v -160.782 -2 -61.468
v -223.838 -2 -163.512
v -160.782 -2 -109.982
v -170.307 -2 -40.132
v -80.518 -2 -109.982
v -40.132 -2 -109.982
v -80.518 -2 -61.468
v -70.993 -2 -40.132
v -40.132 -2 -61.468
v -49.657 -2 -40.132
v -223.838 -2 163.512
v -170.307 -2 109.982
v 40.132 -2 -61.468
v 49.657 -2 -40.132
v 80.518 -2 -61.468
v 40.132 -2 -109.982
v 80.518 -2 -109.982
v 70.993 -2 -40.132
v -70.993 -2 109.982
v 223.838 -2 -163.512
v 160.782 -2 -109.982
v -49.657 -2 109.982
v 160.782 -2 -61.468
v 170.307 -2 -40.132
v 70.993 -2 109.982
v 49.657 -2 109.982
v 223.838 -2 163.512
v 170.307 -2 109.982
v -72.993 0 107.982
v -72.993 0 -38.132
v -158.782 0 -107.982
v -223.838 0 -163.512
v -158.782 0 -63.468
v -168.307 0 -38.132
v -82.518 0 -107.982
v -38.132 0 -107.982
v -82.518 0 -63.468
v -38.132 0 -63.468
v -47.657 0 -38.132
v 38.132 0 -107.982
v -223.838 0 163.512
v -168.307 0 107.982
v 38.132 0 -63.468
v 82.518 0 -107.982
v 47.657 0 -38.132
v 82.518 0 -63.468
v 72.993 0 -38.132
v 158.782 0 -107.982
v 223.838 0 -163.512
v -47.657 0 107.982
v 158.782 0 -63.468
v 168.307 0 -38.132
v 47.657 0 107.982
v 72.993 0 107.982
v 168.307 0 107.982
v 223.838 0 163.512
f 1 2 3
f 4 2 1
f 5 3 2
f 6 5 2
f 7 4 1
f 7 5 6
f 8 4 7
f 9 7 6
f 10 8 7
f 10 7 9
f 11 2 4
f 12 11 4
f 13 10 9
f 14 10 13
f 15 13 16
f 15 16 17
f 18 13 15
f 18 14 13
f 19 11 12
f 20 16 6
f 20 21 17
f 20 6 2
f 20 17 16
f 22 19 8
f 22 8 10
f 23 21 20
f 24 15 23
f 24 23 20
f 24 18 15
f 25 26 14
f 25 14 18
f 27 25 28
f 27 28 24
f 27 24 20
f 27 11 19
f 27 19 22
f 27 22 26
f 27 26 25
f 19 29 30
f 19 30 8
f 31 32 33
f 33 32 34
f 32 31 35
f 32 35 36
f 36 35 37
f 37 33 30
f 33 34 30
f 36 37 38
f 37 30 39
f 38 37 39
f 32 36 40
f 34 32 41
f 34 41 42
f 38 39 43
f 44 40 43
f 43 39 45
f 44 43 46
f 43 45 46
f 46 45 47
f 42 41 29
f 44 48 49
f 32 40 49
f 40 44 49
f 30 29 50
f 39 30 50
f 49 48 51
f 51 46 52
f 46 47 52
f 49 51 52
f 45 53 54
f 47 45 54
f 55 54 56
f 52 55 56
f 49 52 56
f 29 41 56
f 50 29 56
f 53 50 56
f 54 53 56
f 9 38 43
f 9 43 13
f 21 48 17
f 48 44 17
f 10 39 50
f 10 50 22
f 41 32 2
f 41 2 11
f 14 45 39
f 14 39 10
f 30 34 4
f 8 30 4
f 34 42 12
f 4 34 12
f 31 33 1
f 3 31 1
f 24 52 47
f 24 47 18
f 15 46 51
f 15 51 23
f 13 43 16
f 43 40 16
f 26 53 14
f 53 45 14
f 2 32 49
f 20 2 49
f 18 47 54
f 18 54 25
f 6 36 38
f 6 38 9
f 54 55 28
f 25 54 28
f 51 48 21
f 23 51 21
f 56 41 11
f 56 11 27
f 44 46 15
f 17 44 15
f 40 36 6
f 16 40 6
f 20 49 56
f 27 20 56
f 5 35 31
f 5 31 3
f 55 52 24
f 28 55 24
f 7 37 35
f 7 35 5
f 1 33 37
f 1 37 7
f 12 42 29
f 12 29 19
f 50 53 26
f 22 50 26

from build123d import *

# Parameters (mm, degrees)
F0_W          = 447.675
F0_H          = 327.025
F0_W_2        = 76.2
F0_H_2        = 44.45
F0_W_3        = 95.25
F0_H_3        = 146.05
F1_DEPTH      = 2
F2_T1_DEPTH   = 95.25
F2_T3_DEPTH   = 146.05
F2_T5_DEPTH   = 95.25
F2_T7_DEPTH   = 95.25
F2_T9_DEPTH   = 76.2
F2_T11_DEPTH  = 44.45
F2_T13_DEPTH  = 76.2
F2_T15_DEPTH  = 76.2
F2_T21_DEPTH  = 151.2756598315
F2_T25_DEPTH  = 100.4756598315
F2_T32_DEPTH  = 100.4756598315
F2_T36_DEPTH  = 151.2756598315
F2_T43_DEPTH  = 151.2756598315
F2_T47_DEPTH  = 100.4756598315
F2_T54_DEPTH  = 151.2756598315
F2_T58_DEPTH  = 100.4756598315
F2_T65_DEPTH  = 151.2756598315
F2_T69_DEPTH  = 100.4756598315
F2_T76_DEPTH  = 151.2756598315
F2_T80_DEPTH  = 100.4756598315
F2_T87_DEPTH  = 100.4756598315
F2_T91_DEPTH  = 151.2756598315
F2_T98_DEPTH  = 151.2756598315
F2_T102_DEPTH = 100.4756598315
F2_T109_DEPTH = 151.2756598315
F2_T113_DEPTH = 100.4756598315
F2_T120_DEPTH = 100.4756598315
F2_T124_DEPTH = 151.2756598315
F2_T131_DEPTH = 151.2756598315
F2_T135_DEPTH = 100.4756598315
F2_T142_DEPTH = 151.2756598315
F2_T146_DEPTH = 100.4756598315
F2_T153_DEPTH = 49.6756598315
F2_T157_DEPTH = 81.4256598315
F2_T164_DEPTH = 81.4256598315
F2_T168_DEPTH = 49.6756598315
F2_T175_DEPTH = 49.6756598315
F2_T179_DEPTH = 81.4256598315
F2_T186_DEPTH = 49.6756598315
F2_T190_DEPTH = 81.4256598315
F2_T197_DEPTH = 81.4256598315
F2_T201_DEPTH = 49.6756598315
F2_T208_DEPTH = 81.4256598315
F2_T212_DEPTH = 49.6756598315
F2_T219_DEPTH = 49.6756598315
F2_T223_DEPTH = 81.4256598315
F2_T230_DEPTH = 81.4256598315
F2_T234_DEPTH = 49.6756598315
F2_T241_DEPTH = 49.6756598315
F2_T245_DEPTH = 81.4256598315
F2_T252_DEPTH = 81.4256598315
F2_T256_DEPTH = 49.6756598315
F2_T263_DEPTH = 81.4256598315
F2_T267_DEPTH = 49.6756598315
F2_T274_DEPTH = 81.4256598315
F2_T278_DEPTH = 49.6756598315


# Not quite as in the source:
# - a fillet or chamfer that OpenCascade refuses, or shapes differently, is made with other operations: its cross-section is extruded or revolved along the edge and cut away or added


with BuildPart() as f1:
    # F0 (on Front) → F1 (new body)
    with BuildSketch(Plane.XZ):
        Rectangle(F0_W, F0_H)
        with Locations((-120.65, -85.725)):
            Rectangle(F0_W_2, F0_H_2, mode=Mode.SUBTRACT)
        with Locations((0, -85.725)):
            Rectangle(F0_W_2, F0_H_2, mode=Mode.SUBTRACT)
        with Locations((120.65, -85.725)):
            Rectangle(F0_W_2, F0_H_2, mode=Mode.SUBTRACT)
        with Locations((-120.65, 34.925)):
            Rectangle(F0_W_3, F0_H_3, mode=Mode.SUBTRACT)
        with Locations((0, 34.925)):
            Rectangle(F0_W_3, F0_H_3, mode=Mode.SUBTRACT)
        with Locations((120.65, 34.925)):
            Rectangle(F0_W_3, F0_H_3, mode=Mode.SUBTRACT)
    extrude(amount=F1_DEPTH)

    # F2: chamfer of 2.032 on 24 edges, made by hand

    # F2_s2 → F2_t1 (cut)
    with BuildSketch(Plane.YZ.offset(-168.275)):
        Polygon((0.032, 107.95), (-2, 109.982), (-2, 107.95), align=None)
        Polygon((0.032, -38.1), (-2, -40.132), (-2, -38.1), align=None)
    extrude(amount=F2_T1_DEPTH, mode=Mode.SUBTRACT)

    # F2_s4 → F2_t3 (cut)
    with BuildSketch(Plane.XY.offset(-38.1)):
        Polygon((-168.275, 0.032), (-170.307, -2), (-168.275, -2), align=None)
        Polygon((-73.025, 0.032), (-70.993, -2), (-73.025, -2), align=None)
        Polygon((-47.625, 0.032), (-49.657, -2), (-47.625, -2), align=None)
        Polygon((47.625, 0.032), (49.657, -2), (47.625, -2), align=None)
        Polygon((73.025, 0.032), (70.993, -2), (73.025, -2), align=None)
        Polygon((168.275, 0.032), (170.307, -2), (168.275, -2), align=None)
    extrude(amount=F2_T3_DEPTH, mode=Mode.SUBTRACT)

    # F2_s6 → F2_t5 (cut)
    with BuildSketch(Plane.YZ.offset(-47.625)):
        Polygon((0.032, 107.95), (-2, 109.982), (-2, 107.95), align=None)
        Polygon((0.032, -38.1), (-2, -40.132), (-2, -38.1), align=None)
    extrude(amount=F2_T5_DEPTH, mode=Mode.SUBTRACT)

    # F2_s8 → F2_t7 (cut)
    with BuildSketch(Plane.YZ.offset(73.025)):
        Polygon((0.032, -38.1), (-2, -40.132), (-2, -38.1), align=None)
        Polygon((0.032, 107.95), (-2, 109.982), (-2, 107.95), align=None)
    extrude(amount=F2_T7_DEPTH, mode=Mode.SUBTRACT)

    # F2_s10 → F2_t9 (cut)
    with BuildSketch(Plane.YZ.offset(82.55)):
        Polygon((0.032, -63.5), (-2, -61.468), (-2, -63.5), align=None)
        Polygon((0.032, -107.95), (-2, -109.982), (-2, -107.95), align=None)
    extrude(amount=F2_T9_DEPTH, mode=Mode.SUBTRACT)

    # F2_s12 → F2_t11 (cut)
    with BuildSketch(Plane.XY.offset(-107.95)):
        Polygon((158.75, 0.032), (160.782, -2), (158.75, -2), align=None)
        Polygon((82.55, 0.032), (80.518, -2), (82.55, -2), align=None)
        Polygon((38.1, 0.032), (40.132, -2), (38.1, -2), align=None)
        Polygon((-38.1, 0.032), (-40.132, -2), (-38.1, -2), align=None)
        Polygon((-82.55, 0.032), (-80.518, -2), (-82.55, -2), align=None)
        Polygon((-158.75, 0.032), (-160.782, -2), (-158.75, -2), align=None)
    extrude(amount=F2_T11_DEPTH, mode=Mode.SUBTRACT)

    # F2_s14 → F2_t13 (cut)
    with BuildSketch(Plane.YZ.offset(-38.1)):
        Polygon((0.032, -63.5), (-2, -61.468), (-2, -63.5), align=None)
        Polygon((0.032, -107.95), (-2, -109.982), (-2, -107.95), align=None)
    extrude(amount=F2_T13_DEPTH, mode=Mode.SUBTRACT)

    # F2_s16 → F2_t15 (cut)
    with BuildSketch(Plane.YZ.offset(-158.75)):
        Polygon((0.032, -107.95), (-2, -109.982), (-2, -107.95), align=None)
        Polygon((0.032, -63.5), (-2, -61.468), (-2, -63.5), align=None)
    extrude(amount=F2_T15_DEPTH, mode=Mode.SUBTRACT)


with BuildPart() as f2_tool19:
    # F2_s20 → F2_t21 (new body)
    with BuildSketch(Plane.XY.offset(-38.1)):
        Polygon((-168.275, 0.032), (-170.307, -2), (-168.275, -2), align=None)
    extrude(amount=F2_T21_DEPTH)

    split(bisect_by=Plane.XY.offset(107.95), keep=Keep.TOP)


with BuildPart() as f2_tool23:
    # F2_s24 → F2_t25 (new body)
    with BuildSketch(Plane.YZ.offset(-173.5006598315)):
        Polygon((0.032, 107.95), (-2, 109.982), (-2, 107.95), align=None)
    extrude(amount=F2_T25_DEPTH)

    split(bisect_by=Plane.YZ.offset(-168.275), keep=Keep.BOTTOM)


with BuildPart() as f2_tool19_1:
    add(f2_tool19.part)

    # F2_t27: intersect F2_tool23
    add(f2_tool23.part, mode=Mode.INTERSECT)


with BuildPart() as f1_1:
    add(f1.part)

    # F2_t17: cut F2_tool19
    add(f2_tool19_1.part, mode=Mode.SUBTRACT)


with BuildPart() as f2_tool30:
    # F2_s31 → F2_t32 (new body)
    with BuildSketch(Plane.YZ.offset(-168.275)):
        Polygon((0.032, 107.95), (-2, 109.982), (-2, 107.95), align=None)
    extrude(amount=F2_T32_DEPTH)

    split(bisect_by=Plane.YZ.offset(-73.025), keep=Keep.TOP)


with BuildPart() as f2_tool34:
    # F2_s35 → F2_t36 (new body)
    with BuildSketch(Plane.XY.offset(113.1756598315)):
        Polygon((-73.025, 0.032), (-70.993, -2), (-73.025, -2), align=None)
    extrude(amount=-F2_T36_DEPTH)

    split(bisect_by=Plane.XY.offset(107.95), keep=Keep.TOP)


with BuildPart() as f2_tool30_1:
    add(f2_tool30.part)

    # F2_t38: intersect F2_tool34
    add(f2_tool34.part, mode=Mode.INTERSECT)


with BuildPart() as f1_2:
    add(f1_1.part)

    # F2_t28: cut F2_tool30
    add(f2_tool30_1.part, mode=Mode.SUBTRACT)


with BuildPart() as f2_tool41:
    # F2_s42 → F2_t43 (new body)
    with BuildSketch(Plane.XY.offset(-43.3256598315)):
        Polygon((-168.275, 0.032), (-170.307, -2), (-168.275, -2), align=None)
    extrude(amount=F2_T43_DEPTH)

    split(bisect_by=Plane.XY.offset(-38.1), keep=Keep.BOTTOM)


with BuildPart() as f2_tool45:
    # F2_s46 → F2_t47 (new body)
    with BuildSketch(Plane.YZ.offset(-73.025)):
        Polygon((0.032, -38.1), (-2, -40.132), (-2, -38.1), align=None)
    extrude(amount=-F2_T47_DEPTH)

    split(bisect_by=Plane.YZ.offset(-168.275), keep=Keep.BOTTOM)


with BuildPart() as f2_tool41_1:
    add(f2_tool41.part)

    # F2_t49: intersect F2_tool45
    add(f2_tool45.part, mode=Mode.INTERSECT)


with BuildPart() as f1_3:
    add(f1_2.part)

    # F2_t39: cut F2_tool41
    add(f2_tool41_1.part, mode=Mode.SUBTRACT)


with BuildPart() as f2_tool52:
    # F2_s53 → F2_t54 (new body)
    with BuildSketch(Plane.XY.offset(107.95)):
        Polygon((-73.025, 0.032), (-70.993, -2), (-73.025, -2), align=None)
    extrude(amount=-F2_T54_DEPTH)

    split(bisect_by=Plane.XY.offset(-38.1), keep=Keep.BOTTOM)


with BuildPart() as f2_tool56:
    # F2_s57 → F2_t58 (new body)
    with BuildSketch(Plane.YZ.offset(-67.7993401685)):
        Polygon((0.032, -38.1), (-2, -40.132), (-2, -38.1), align=None)
    extrude(amount=-F2_T58_DEPTH)

    split(bisect_by=Plane.YZ.offset(-73.025), keep=Keep.TOP)


with BuildPart() as f2_tool52_1:
    add(f2_tool52.part)

    # F2_t60: intersect F2_tool56
    add(f2_tool56.part, mode=Mode.INTERSECT)


with BuildPart() as f1_4:
    add(f1_3.part)

    # F2_t50: cut F2_tool52
    add(f2_tool52_1.part, mode=Mode.SUBTRACT)


with BuildPart() as f2_tool63:
    # F2_s64 → F2_t65 (new body)
    with BuildSketch(Plane.XY.offset(-38.1)):
        Polygon((-47.625, 0.032), (-49.657, -2), (-47.625, -2), align=None)
    extrude(amount=F2_T65_DEPTH)

    split(bisect_by=Plane.XY.offset(107.95), keep=Keep.TOP)


with BuildPart() as f2_tool67:
    # F2_s68 → F2_t69 (new body)
    with BuildSketch(Plane.YZ.offset(-52.8506598315)):
        Polygon((0.032, 107.95), (-2, 109.982), (-2, 107.95), align=None)
    extrude(amount=F2_T69_DEPTH)

    split(bisect_by=Plane.YZ.offset(-47.625), keep=Keep.BOTTOM)


with BuildPart() as f2_tool63_1:
    add(f2_tool63.part)

    # F2_t71: intersect F2_tool67
    add(f2_tool67.part, mode=Mode.INTERSECT)


with BuildPart() as f1_5:
    add(f1_4.part)

    # F2_t61: cut F2_tool63
    add(f2_tool63_1.part, mode=Mode.SUBTRACT)


with BuildPart() as f2_tool74:
    # F2_s75 → F2_t76 (new body)
    with BuildSketch(Plane.XY.offset(113.1756598315)):
        Polygon((47.625, 0.032), (49.657, -2), (47.625, -2), align=None)
    extrude(amount=-F2_T76_DEPTH)

    split(bisect_by=Plane.XY.offset(107.95), keep=Keep.TOP)


with BuildPart() as f2_tool78:
    # F2_s79 → F2_t80 (new body)
    with BuildSketch(Plane.YZ.offset(-47.625)):
        Polygon((0.032, 107.95), (-2, 109.982), (-2, 107.95), align=None)
    extrude(amount=F2_T80_DEPTH)

    split(bisect_by=Plane.YZ.offset(47.625), keep=Keep.TOP)


with BuildPart() as f2_tool74_1:
    add(f2_tool74.part)

    # F2_t82: intersect F2_tool78
    add(f2_tool78.part, mode=Mode.INTERSECT)


with BuildPart() as f1_6:
    add(f1_5.part)

    # F2_t72: cut F2_tool74
    add(f2_tool74_1.part, mode=Mode.SUBTRACT)


with BuildPart() as f2_tool85:
    # F2_s86 → F2_t87 (new body)
    with BuildSketch(Plane.YZ.offset(47.625)):
        Polygon((0.032, -38.1), (-2, -40.132), (-2, -38.1), align=None)
    extrude(amount=-F2_T87_DEPTH)

    split(bisect_by=Plane.YZ.offset(-47.625), keep=Keep.BOTTOM)


with BuildPart() as f2_tool89:
    # F2_s90 → F2_t91 (new body)
    with BuildSketch(Plane.XY.offset(-43.3256598315)):
        Polygon((-47.625, 0.032), (-49.657, -2), (-47.625, -2), align=None)
    extrude(amount=F2_T91_DEPTH)

    split(bisect_by=Plane.XY.offset(-38.1), keep=Keep.BOTTOM)


with BuildPart() as f2_tool85_1:
    add(f2_tool85.part)

    # F2_t93: intersect F2_tool89
    add(f2_tool89.part, mode=Mode.INTERSECT)


with BuildPart() as f1_7:
    add(f1_6.part)

    # F2_t83: cut F2_tool85
    add(f2_tool85_1.part, mode=Mode.SUBTRACT)


with BuildPart() as f2_tool96:
    # F2_s97 → F2_t98 (new body)
    with BuildSketch(Plane.XY.offset(107.95)):
        Polygon((47.625, 0.032), (49.657, -2), (47.625, -2), align=None)
    extrude(amount=-F2_T98_DEPTH)

    split(bisect_by=Plane.XY.offset(-38.1), keep=Keep.BOTTOM)


with BuildPart() as f2_tool100:
    # F2_s101 → F2_t102 (new body)
    with BuildSketch(Plane.YZ.offset(52.8506598315)):
        Polygon((0.032, -38.1), (-2, -40.132), (-2, -38.1), align=None)
    extrude(amount=-F2_T102_DEPTH)

    split(bisect_by=Plane.YZ.offset(47.625), keep=Keep.TOP)


with BuildPart() as f2_tool96_1:
    add(f2_tool96.part)

    # F2_t104: intersect F2_tool100
    add(f2_tool100.part, mode=Mode.INTERSECT)


with BuildPart() as f1_8:
    add(f1_7.part)

    # F2_t94: cut F2_tool96
    add(f2_tool96_1.part, mode=Mode.SUBTRACT)


with BuildPart() as f2_tool107:
    # F2_s108 → F2_t109 (new body)
    with BuildSketch(Plane.XY.offset(107.95)):
        Polygon((168.275, 0.032), (170.307, -2), (168.275, -2), align=None)
    extrude(amount=-F2_T109_DEPTH)

    split(bisect_by=Plane.XY.offset(-38.1), keep=Keep.BOTTOM)


with BuildPart() as f2_tool111:
    # F2_s112 → F2_t113 (new body)
    with BuildSketch(Plane.YZ.offset(173.5006598315)):
        Polygon((0.032, -38.1), (-2, -40.132), (-2, -38.1), align=None)
    extrude(amount=-F2_T113_DEPTH)

    split(bisect_by=Plane.YZ.offset(168.275), keep=Keep.TOP)


with BuildPart() as f2_tool107_1:
    add(f2_tool107.part)

    # F2_t115: intersect F2_tool111
    add(f2_tool111.part, mode=Mode.INTERSECT)


with BuildPart() as f1_9:
    add(f1_8.part)

    # F2_t105: cut F2_tool107
    add(f2_tool107_1.part, mode=Mode.SUBTRACT)


with BuildPart() as f2_tool118:
    # F2_s119 → F2_t120 (new body)
    with BuildSketch(Plane.YZ.offset(168.275)):
        Polygon((0.032, -38.1), (-2, -40.132), (-2, -38.1), align=None)
    extrude(amount=-F2_T120_DEPTH)

    split(bisect_by=Plane.YZ.offset(73.025), keep=Keep.BOTTOM)


with BuildPart() as f2_tool122:
    # F2_s123 → F2_t124 (new body)
    with BuildSketch(Plane.XY.offset(-43.3256598315)):
        Polygon((73.025, 0.032), (70.993, -2), (73.025, -2), align=None)
    extrude(amount=F2_T124_DEPTH)

    split(bisect_by=Plane.XY.offset(-38.1), keep=Keep.BOTTOM)


with BuildPart() as f2_tool118_1:
    add(f2_tool118.part)

    # F2_t126: intersect F2_tool122
    add(f2_tool122.part, mode=Mode.INTERSECT)


with BuildPart() as f1_10:
    add(f1_9.part)

    # F2_t116: cut F2_tool118
    add(f2_tool118_1.part, mode=Mode.SUBTRACT)


with BuildPart() as f2_tool129:
    # F2_s130 → F2_t131 (new body)
    with BuildSketch(Plane.XY.offset(-38.1)):
        Polygon((73.025, 0.032), (70.993, -2), (73.025, -2), align=None)
    extrude(amount=F2_T131_DEPTH)

    split(bisect_by=Plane.XY.offset(107.95), keep=Keep.TOP)


with BuildPart() as f2_tool133:
    # F2_s134 → F2_t135 (new body)
    with BuildSketch(Plane.YZ.offset(67.7993401685)):
        Polygon((0.032, 107.95), (-2, 109.982), (-2, 107.95), align=None)
    extrude(amount=F2_T135_DEPTH)

    split(bisect_by=Plane.YZ.offset(73.025), keep=Keep.BOTTOM)


with BuildPart() as f2_tool129_1:
    add(f2_tool129.part)

    # F2_t137: intersect F2_tool133
    add(f2_tool133.part, mode=Mode.INTERSECT)


with BuildPart() as f1_11:
    add(f1_10.part)

    # F2_t127: cut F2_tool129
    add(f2_tool129_1.part, mode=Mode.SUBTRACT)


with BuildPart() as f2_tool140:
    # F2_s141 → F2_t142 (new body)
    with BuildSketch(Plane.XY.offset(113.1756598315)):
        Polygon((168.275, 0.032), (170.307, -2), (168.275, -2), align=None)
    extrude(amount=-F2_T142_DEPTH)

    split(bisect_by=Plane.XY.offset(107.95), keep=Keep.TOP)


with BuildPart() as f2_tool144:
    # F2_s145 → F2_t146 (new body)
    with BuildSketch(Plane.YZ.offset(73.025)):
        Polygon((0.032, 107.95), (-2, 109.982), (-2, 107.95), align=None)
    extrude(amount=F2_T146_DEPTH)

    split(bisect_by=Plane.YZ.offset(168.275), keep=Keep.TOP)


with BuildPart() as f2_tool140_1:
    add(f2_tool140.part)

    # F2_t148: intersect F2_tool144
    add(f2_tool144.part, mode=Mode.INTERSECT)


with BuildPart() as f1_12:
    add(f1_11.part)

    # F2_t138: cut F2_tool140
    add(f2_tool140_1.part, mode=Mode.SUBTRACT)


with BuildPart() as f2_tool151:
    # F2_s152 → F2_t153 (new body)
    with BuildSketch(Plane.XY.offset(-107.95)):
        Polygon((82.55, 0.032), (80.518, -2), (82.55, -2), align=None)
    extrude(amount=F2_T153_DEPTH)

    split(bisect_by=Plane.XY.offset(-63.5), keep=Keep.TOP)


with BuildPart() as f2_tool155:
    # F2_s156 → F2_t157 (new body)
    with BuildSketch(Plane.YZ.offset(77.3243401685)):
        Polygon((0.032, -63.5), (-2, -61.468), (-2, -63.5), align=None)
    extrude(amount=F2_T157_DEPTH)

    split(bisect_by=Plane.YZ.offset(82.55), keep=Keep.BOTTOM)


with BuildPart() as f2_tool151_1:
    add(f2_tool151.part)

    # F2_t159: intersect F2_tool155
    add(f2_tool155.part, mode=Mode.INTERSECT)


with BuildPart() as f1_13:
    add(f1_12.part)

    # F2_t149: cut F2_tool151
    add(f2_tool151_1.part, mode=Mode.SUBTRACT)


with BuildPart() as f2_tool162:
    # F2_s163 → F2_t164 (new body)
    with BuildSketch(Plane.YZ.offset(82.55)):
        Polygon((0.032, -63.5), (-2, -61.468), (-2, -63.5), align=None)
    extrude(amount=F2_T164_DEPTH)

    split(bisect_by=Plane.YZ.offset(158.75), keep=Keep.TOP)


with BuildPart() as f2_tool166:
    # F2_s167 → F2_t168 (new body)
    with BuildSketch(Plane.XY.offset(-58.2743401685)):
        Polygon((158.75, 0.032), (160.782, -2), (158.75, -2), align=None)
    extrude(amount=-F2_T168_DEPTH)

    split(bisect_by=Plane.XY.offset(-63.5), keep=Keep.TOP)


with BuildPart() as f2_tool162_1:
    add(f2_tool162.part)

    # F2_t170: intersect F2_tool166
    add(f2_tool166.part, mode=Mode.INTERSECT)


with BuildPart() as f1_14:
    add(f1_13.part)

    # F2_t160: cut F2_tool162
    add(f2_tool162_1.part, mode=Mode.SUBTRACT)


with BuildPart() as f2_tool173:
    # F2_s174 → F2_t175 (new body)
    with BuildSketch(Plane.XY.offset(-63.5)):
        Polygon((158.75, 0.032), (160.782, -2), (158.75, -2), align=None)
    extrude(amount=-F2_T175_DEPTH)

    split(bisect_by=Plane.XY.offset(-107.95), keep=Keep.BOTTOM)


with BuildPart() as f2_tool177:
    # F2_s178 → F2_t179 (new body)
    with BuildSketch(Plane.YZ.offset(163.9756598315)):
        Polygon((0.032, -107.95), (-2, -109.982), (-2, -107.95), align=None)
    extrude(amount=-F2_T179_DEPTH)

    split(bisect_by=Plane.YZ.offset(158.75), keep=Keep.TOP)


with BuildPart() as f2_tool173_1:
    add(f2_tool173.part)

    # F2_t181: intersect F2_tool177
    add(f2_tool177.part, mode=Mode.INTERSECT)


with BuildPart() as f1_15:
    add(f1_14.part)

    # F2_t171: cut F2_tool173
    add(f2_tool173_1.part, mode=Mode.SUBTRACT)


with BuildPart() as f2_tool184:
    # F2_s185 → F2_t186 (new body)
    with BuildSketch(Plane.XY.offset(-113.1756598315)):
        Polygon((82.55, 0.032), (80.518, -2), (82.55, -2), align=None)
    extrude(amount=F2_T186_DEPTH)

    split(bisect_by=Plane.XY.offset(-107.95), keep=Keep.BOTTOM)


with BuildPart() as f2_tool188:
    # F2_s189 → F2_t190 (new body)
    with BuildSketch(Plane.YZ.offset(158.75)):
        Polygon((0.032, -107.95), (-2, -109.982), (-2, -107.95), align=None)
    extrude(amount=-F2_T190_DEPTH)

    split(bisect_by=Plane.YZ.offset(82.55), keep=Keep.BOTTOM)


with BuildPart() as f2_tool184_1:
    add(f2_tool184.part)

    # F2_t192: intersect F2_tool188
    add(f2_tool188.part, mode=Mode.INTERSECT)


with BuildPart() as f1_16:
    add(f1_15.part)

    # F2_t182: cut F2_tool184
    add(f2_tool184_1.part, mode=Mode.SUBTRACT)


with BuildPart() as f2_tool195:
    # F2_s196 → F2_t197 (new body)
    with BuildSketch(Plane.YZ.offset(-38.1)):
        Polygon((0.032, -63.5), (-2, -61.468), (-2, -63.5), align=None)
    extrude(amount=F2_T197_DEPTH)

    split(bisect_by=Plane.YZ.offset(38.1), keep=Keep.TOP)


with BuildPart() as f2_tool199:
    # F2_s200 → F2_t201 (new body)
    with BuildSketch(Plane.XY.offset(-58.2743401685)):
        Polygon((38.1, 0.032), (40.132, -2), (38.1, -2), align=None)
    extrude(amount=-F2_T201_DEPTH)

    split(bisect_by=Plane.XY.offset(-63.5), keep=Keep.TOP)


with BuildPart() as f2_tool195_1:
    add(f2_tool195.part)

    # F2_t203: intersect F2_tool199
    add(f2_tool199.part, mode=Mode.INTERSECT)


with BuildPart() as f1_17:
    add(f1_16.part)

    # F2_t193: cut F2_tool195
    add(f2_tool195_1.part, mode=Mode.SUBTRACT)


with BuildPart() as f2_tool206:
    # F2_s207 → F2_t208 (new body)
    with BuildSketch(Plane.YZ.offset(43.3256598315)):
        Polygon((0.032, -107.95), (-2, -109.982), (-2, -107.95), align=None)
    extrude(amount=-F2_T208_DEPTH)

    split(bisect_by=Plane.YZ.offset(38.1), keep=Keep.TOP)


with BuildPart() as f2_tool210:
    # F2_s211 → F2_t212 (new body)
    with BuildSketch(Plane.XY.offset(-63.5)):
        Polygon((38.1, 0.032), (40.132, -2), (38.1, -2), align=None)
    extrude(amount=-F2_T212_DEPTH)

    split(bisect_by=Plane.XY.offset(-107.95), keep=Keep.BOTTOM)


with BuildPart() as f2_tool206_1:
    add(f2_tool206.part)

    # F2_t214: intersect F2_tool210
    add(f2_tool210.part, mode=Mode.INTERSECT)


with BuildPart() as f1_18:
    add(f1_17.part)

    # F2_t204: cut F2_tool206
    add(f2_tool206_1.part, mode=Mode.SUBTRACT)


with BuildPart() as f2_tool217:
    # F2_s218 → F2_t219 (new body)
    with BuildSketch(Plane.XY.offset(-107.95)):
        Polygon((-38.1, 0.032), (-40.132, -2), (-38.1, -2), align=None)
    extrude(amount=F2_T219_DEPTH)

    split(bisect_by=Plane.XY.offset(-63.5), keep=Keep.TOP)


with BuildPart() as f2_tool221:
    # F2_s222 → F2_t223 (new body)
    with BuildSketch(Plane.YZ.offset(-43.3256598315)):
        Polygon((0.032, -63.5), (-2, -61.468), (-2, -63.5), align=None)
    extrude(amount=F2_T223_DEPTH)

    split(bisect_by=Plane.YZ.offset(-38.1), keep=Keep.BOTTOM)


with BuildPart() as f2_tool217_1:
    add(f2_tool217.part)

    # F2_t225: intersect F2_tool221
    add(f2_tool221.part, mode=Mode.INTERSECT)


with BuildPart() as f1_19:
    add(f1_18.part)

    # F2_t215: cut F2_tool217
    add(f2_tool217_1.part, mode=Mode.SUBTRACT)


with BuildPart() as f2_tool228:
    # F2_s229 → F2_t230 (new body)
    with BuildSketch(Plane.YZ.offset(38.1)):
        Polygon((0.032, -107.95), (-2, -109.982), (-2, -107.95), align=None)
    extrude(amount=-F2_T230_DEPTH)

    split(bisect_by=Plane.YZ.offset(-38.1), keep=Keep.BOTTOM)


with BuildPart() as f2_tool232:
    # F2_s233 → F2_t234 (new body)
    with BuildSketch(Plane.XY.offset(-113.1756598315)):
        Polygon((-38.1, 0.032), (-40.132, -2), (-38.1, -2), align=None)
    extrude(amount=F2_T234_DEPTH)

    split(bisect_by=Plane.XY.offset(-107.95), keep=Keep.BOTTOM)


with BuildPart() as f2_tool228_1:
    add(f2_tool228.part)

    # F2_t236: intersect F2_tool232
    add(f2_tool232.part, mode=Mode.INTERSECT)


with BuildPart() as f1_20:
    add(f1_19.part)

    # F2_t226: cut F2_tool228
    add(f2_tool228_1.part, mode=Mode.SUBTRACT)


with BuildPart() as f2_tool239:
    # F2_s240 → F2_t241 (new body)
    with BuildSketch(Plane.XY.offset(-63.5)):
        Polygon((-82.55, 0.032), (-80.518, -2), (-82.55, -2), align=None)
    extrude(amount=-F2_T241_DEPTH)

    split(bisect_by=Plane.XY.offset(-107.95), keep=Keep.BOTTOM)


with BuildPart() as f2_tool243:
    # F2_s244 → F2_t245 (new body)
    with BuildSketch(Plane.YZ.offset(-77.3243401685)):
        Polygon((0.032, -107.95), (-2, -109.982), (-2, -107.95), align=None)
    extrude(amount=-F2_T245_DEPTH)

    split(bisect_by=Plane.YZ.offset(-82.55), keep=Keep.TOP)


with BuildPart() as f2_tool239_1:
    add(f2_tool239.part)

    # F2_t247: intersect F2_tool243
    add(f2_tool243.part, mode=Mode.INTERSECT)


with BuildPart() as f1_21:
    add(f1_20.part)

    # F2_t237: cut F2_tool239
    add(f2_tool239_1.part, mode=Mode.SUBTRACT)


with BuildPart() as f2_tool250:
    # F2_s251 → F2_t252 (new body)
    with BuildSketch(Plane.YZ.offset(-82.55)):
        Polygon((0.032, -107.95), (-2, -109.982), (-2, -107.95), align=None)
    extrude(amount=-F2_T252_DEPTH)

    split(bisect_by=Plane.YZ.offset(-158.75), keep=Keep.BOTTOM)


with BuildPart() as f2_tool254:
    # F2_s255 → F2_t256 (new body)
    with BuildSketch(Plane.XY.offset(-113.1756598315)):
        Polygon((-158.75, 0.032), (-160.782, -2), (-158.75, -2), align=None)
    extrude(amount=F2_T256_DEPTH)

    split(bisect_by=Plane.XY.offset(-107.95), keep=Keep.BOTTOM)


with BuildPart() as f2_tool250_1:
    add(f2_tool250.part)

    # F2_t258: intersect F2_tool254
    add(f2_tool254.part, mode=Mode.INTERSECT)


with BuildPart() as f1_22:
    add(f1_21.part)

    # F2_t248: cut F2_tool250
    add(f2_tool250_1.part, mode=Mode.SUBTRACT)


with BuildPart() as f2_tool261:
    # F2_s262 → F2_t263 (new body)
    with BuildSketch(Plane.YZ.offset(-158.75)):
        Polygon((0.032, -63.5), (-2, -61.468), (-2, -63.5), align=None)
    extrude(amount=F2_T263_DEPTH)

    split(bisect_by=Plane.YZ.offset(-82.55), keep=Keep.TOP)


with BuildPart() as f2_tool265:
    # F2_s266 → F2_t267 (new body)
    with BuildSketch(Plane.XY.offset(-58.2743401685)):
        Polygon((-82.55, 0.032), (-80.518, -2), (-82.55, -2), align=None)
    extrude(amount=-F2_T267_DEPTH)

    split(bisect_by=Plane.XY.offset(-63.5), keep=Keep.TOP)


with BuildPart() as f2_tool261_1:
    add(f2_tool261.part)

    # F2_t269: intersect F2_tool265
    add(f2_tool265.part, mode=Mode.INTERSECT)


with BuildPart() as f1_23:
    add(f1_22.part)

    # F2_t259: cut F2_tool261
    add(f2_tool261_1.part, mode=Mode.SUBTRACT)


with BuildPart() as f2_tool272:
    # F2_s273 → F2_t274 (new body)
    with BuildSketch(Plane.YZ.offset(-163.9756598315)):
        Polygon((0.032, -63.5), (-2, -61.468), (-2, -63.5), align=None)
    extrude(amount=F2_T274_DEPTH)

    split(bisect_by=Plane.YZ.offset(-158.75), keep=Keep.BOTTOM)


with BuildPart() as f2_tool276:
    # F2_s277 → F2_t278 (new body)
    with BuildSketch(Plane.XY.offset(-107.95)):
        Polygon((-158.75, 0.032), (-160.782, -2), (-158.75, -2), align=None)
    extrude(amount=F2_T278_DEPTH)

    split(bisect_by=Plane.XY.offset(-63.5), keep=Keep.TOP)


with BuildPart() as f2_tool272_1:
    add(f2_tool272.part)

    # F2_t280: intersect F2_tool276
    add(f2_tool276.part, mode=Mode.INTERSECT)


with BuildPart() as f1_24:
    add(f1_23.part)

    # F2_t270: cut F2_tool272
    add(f2_tool272_1.part, mode=Mode.SUBTRACT)


solid = f1_24.part
